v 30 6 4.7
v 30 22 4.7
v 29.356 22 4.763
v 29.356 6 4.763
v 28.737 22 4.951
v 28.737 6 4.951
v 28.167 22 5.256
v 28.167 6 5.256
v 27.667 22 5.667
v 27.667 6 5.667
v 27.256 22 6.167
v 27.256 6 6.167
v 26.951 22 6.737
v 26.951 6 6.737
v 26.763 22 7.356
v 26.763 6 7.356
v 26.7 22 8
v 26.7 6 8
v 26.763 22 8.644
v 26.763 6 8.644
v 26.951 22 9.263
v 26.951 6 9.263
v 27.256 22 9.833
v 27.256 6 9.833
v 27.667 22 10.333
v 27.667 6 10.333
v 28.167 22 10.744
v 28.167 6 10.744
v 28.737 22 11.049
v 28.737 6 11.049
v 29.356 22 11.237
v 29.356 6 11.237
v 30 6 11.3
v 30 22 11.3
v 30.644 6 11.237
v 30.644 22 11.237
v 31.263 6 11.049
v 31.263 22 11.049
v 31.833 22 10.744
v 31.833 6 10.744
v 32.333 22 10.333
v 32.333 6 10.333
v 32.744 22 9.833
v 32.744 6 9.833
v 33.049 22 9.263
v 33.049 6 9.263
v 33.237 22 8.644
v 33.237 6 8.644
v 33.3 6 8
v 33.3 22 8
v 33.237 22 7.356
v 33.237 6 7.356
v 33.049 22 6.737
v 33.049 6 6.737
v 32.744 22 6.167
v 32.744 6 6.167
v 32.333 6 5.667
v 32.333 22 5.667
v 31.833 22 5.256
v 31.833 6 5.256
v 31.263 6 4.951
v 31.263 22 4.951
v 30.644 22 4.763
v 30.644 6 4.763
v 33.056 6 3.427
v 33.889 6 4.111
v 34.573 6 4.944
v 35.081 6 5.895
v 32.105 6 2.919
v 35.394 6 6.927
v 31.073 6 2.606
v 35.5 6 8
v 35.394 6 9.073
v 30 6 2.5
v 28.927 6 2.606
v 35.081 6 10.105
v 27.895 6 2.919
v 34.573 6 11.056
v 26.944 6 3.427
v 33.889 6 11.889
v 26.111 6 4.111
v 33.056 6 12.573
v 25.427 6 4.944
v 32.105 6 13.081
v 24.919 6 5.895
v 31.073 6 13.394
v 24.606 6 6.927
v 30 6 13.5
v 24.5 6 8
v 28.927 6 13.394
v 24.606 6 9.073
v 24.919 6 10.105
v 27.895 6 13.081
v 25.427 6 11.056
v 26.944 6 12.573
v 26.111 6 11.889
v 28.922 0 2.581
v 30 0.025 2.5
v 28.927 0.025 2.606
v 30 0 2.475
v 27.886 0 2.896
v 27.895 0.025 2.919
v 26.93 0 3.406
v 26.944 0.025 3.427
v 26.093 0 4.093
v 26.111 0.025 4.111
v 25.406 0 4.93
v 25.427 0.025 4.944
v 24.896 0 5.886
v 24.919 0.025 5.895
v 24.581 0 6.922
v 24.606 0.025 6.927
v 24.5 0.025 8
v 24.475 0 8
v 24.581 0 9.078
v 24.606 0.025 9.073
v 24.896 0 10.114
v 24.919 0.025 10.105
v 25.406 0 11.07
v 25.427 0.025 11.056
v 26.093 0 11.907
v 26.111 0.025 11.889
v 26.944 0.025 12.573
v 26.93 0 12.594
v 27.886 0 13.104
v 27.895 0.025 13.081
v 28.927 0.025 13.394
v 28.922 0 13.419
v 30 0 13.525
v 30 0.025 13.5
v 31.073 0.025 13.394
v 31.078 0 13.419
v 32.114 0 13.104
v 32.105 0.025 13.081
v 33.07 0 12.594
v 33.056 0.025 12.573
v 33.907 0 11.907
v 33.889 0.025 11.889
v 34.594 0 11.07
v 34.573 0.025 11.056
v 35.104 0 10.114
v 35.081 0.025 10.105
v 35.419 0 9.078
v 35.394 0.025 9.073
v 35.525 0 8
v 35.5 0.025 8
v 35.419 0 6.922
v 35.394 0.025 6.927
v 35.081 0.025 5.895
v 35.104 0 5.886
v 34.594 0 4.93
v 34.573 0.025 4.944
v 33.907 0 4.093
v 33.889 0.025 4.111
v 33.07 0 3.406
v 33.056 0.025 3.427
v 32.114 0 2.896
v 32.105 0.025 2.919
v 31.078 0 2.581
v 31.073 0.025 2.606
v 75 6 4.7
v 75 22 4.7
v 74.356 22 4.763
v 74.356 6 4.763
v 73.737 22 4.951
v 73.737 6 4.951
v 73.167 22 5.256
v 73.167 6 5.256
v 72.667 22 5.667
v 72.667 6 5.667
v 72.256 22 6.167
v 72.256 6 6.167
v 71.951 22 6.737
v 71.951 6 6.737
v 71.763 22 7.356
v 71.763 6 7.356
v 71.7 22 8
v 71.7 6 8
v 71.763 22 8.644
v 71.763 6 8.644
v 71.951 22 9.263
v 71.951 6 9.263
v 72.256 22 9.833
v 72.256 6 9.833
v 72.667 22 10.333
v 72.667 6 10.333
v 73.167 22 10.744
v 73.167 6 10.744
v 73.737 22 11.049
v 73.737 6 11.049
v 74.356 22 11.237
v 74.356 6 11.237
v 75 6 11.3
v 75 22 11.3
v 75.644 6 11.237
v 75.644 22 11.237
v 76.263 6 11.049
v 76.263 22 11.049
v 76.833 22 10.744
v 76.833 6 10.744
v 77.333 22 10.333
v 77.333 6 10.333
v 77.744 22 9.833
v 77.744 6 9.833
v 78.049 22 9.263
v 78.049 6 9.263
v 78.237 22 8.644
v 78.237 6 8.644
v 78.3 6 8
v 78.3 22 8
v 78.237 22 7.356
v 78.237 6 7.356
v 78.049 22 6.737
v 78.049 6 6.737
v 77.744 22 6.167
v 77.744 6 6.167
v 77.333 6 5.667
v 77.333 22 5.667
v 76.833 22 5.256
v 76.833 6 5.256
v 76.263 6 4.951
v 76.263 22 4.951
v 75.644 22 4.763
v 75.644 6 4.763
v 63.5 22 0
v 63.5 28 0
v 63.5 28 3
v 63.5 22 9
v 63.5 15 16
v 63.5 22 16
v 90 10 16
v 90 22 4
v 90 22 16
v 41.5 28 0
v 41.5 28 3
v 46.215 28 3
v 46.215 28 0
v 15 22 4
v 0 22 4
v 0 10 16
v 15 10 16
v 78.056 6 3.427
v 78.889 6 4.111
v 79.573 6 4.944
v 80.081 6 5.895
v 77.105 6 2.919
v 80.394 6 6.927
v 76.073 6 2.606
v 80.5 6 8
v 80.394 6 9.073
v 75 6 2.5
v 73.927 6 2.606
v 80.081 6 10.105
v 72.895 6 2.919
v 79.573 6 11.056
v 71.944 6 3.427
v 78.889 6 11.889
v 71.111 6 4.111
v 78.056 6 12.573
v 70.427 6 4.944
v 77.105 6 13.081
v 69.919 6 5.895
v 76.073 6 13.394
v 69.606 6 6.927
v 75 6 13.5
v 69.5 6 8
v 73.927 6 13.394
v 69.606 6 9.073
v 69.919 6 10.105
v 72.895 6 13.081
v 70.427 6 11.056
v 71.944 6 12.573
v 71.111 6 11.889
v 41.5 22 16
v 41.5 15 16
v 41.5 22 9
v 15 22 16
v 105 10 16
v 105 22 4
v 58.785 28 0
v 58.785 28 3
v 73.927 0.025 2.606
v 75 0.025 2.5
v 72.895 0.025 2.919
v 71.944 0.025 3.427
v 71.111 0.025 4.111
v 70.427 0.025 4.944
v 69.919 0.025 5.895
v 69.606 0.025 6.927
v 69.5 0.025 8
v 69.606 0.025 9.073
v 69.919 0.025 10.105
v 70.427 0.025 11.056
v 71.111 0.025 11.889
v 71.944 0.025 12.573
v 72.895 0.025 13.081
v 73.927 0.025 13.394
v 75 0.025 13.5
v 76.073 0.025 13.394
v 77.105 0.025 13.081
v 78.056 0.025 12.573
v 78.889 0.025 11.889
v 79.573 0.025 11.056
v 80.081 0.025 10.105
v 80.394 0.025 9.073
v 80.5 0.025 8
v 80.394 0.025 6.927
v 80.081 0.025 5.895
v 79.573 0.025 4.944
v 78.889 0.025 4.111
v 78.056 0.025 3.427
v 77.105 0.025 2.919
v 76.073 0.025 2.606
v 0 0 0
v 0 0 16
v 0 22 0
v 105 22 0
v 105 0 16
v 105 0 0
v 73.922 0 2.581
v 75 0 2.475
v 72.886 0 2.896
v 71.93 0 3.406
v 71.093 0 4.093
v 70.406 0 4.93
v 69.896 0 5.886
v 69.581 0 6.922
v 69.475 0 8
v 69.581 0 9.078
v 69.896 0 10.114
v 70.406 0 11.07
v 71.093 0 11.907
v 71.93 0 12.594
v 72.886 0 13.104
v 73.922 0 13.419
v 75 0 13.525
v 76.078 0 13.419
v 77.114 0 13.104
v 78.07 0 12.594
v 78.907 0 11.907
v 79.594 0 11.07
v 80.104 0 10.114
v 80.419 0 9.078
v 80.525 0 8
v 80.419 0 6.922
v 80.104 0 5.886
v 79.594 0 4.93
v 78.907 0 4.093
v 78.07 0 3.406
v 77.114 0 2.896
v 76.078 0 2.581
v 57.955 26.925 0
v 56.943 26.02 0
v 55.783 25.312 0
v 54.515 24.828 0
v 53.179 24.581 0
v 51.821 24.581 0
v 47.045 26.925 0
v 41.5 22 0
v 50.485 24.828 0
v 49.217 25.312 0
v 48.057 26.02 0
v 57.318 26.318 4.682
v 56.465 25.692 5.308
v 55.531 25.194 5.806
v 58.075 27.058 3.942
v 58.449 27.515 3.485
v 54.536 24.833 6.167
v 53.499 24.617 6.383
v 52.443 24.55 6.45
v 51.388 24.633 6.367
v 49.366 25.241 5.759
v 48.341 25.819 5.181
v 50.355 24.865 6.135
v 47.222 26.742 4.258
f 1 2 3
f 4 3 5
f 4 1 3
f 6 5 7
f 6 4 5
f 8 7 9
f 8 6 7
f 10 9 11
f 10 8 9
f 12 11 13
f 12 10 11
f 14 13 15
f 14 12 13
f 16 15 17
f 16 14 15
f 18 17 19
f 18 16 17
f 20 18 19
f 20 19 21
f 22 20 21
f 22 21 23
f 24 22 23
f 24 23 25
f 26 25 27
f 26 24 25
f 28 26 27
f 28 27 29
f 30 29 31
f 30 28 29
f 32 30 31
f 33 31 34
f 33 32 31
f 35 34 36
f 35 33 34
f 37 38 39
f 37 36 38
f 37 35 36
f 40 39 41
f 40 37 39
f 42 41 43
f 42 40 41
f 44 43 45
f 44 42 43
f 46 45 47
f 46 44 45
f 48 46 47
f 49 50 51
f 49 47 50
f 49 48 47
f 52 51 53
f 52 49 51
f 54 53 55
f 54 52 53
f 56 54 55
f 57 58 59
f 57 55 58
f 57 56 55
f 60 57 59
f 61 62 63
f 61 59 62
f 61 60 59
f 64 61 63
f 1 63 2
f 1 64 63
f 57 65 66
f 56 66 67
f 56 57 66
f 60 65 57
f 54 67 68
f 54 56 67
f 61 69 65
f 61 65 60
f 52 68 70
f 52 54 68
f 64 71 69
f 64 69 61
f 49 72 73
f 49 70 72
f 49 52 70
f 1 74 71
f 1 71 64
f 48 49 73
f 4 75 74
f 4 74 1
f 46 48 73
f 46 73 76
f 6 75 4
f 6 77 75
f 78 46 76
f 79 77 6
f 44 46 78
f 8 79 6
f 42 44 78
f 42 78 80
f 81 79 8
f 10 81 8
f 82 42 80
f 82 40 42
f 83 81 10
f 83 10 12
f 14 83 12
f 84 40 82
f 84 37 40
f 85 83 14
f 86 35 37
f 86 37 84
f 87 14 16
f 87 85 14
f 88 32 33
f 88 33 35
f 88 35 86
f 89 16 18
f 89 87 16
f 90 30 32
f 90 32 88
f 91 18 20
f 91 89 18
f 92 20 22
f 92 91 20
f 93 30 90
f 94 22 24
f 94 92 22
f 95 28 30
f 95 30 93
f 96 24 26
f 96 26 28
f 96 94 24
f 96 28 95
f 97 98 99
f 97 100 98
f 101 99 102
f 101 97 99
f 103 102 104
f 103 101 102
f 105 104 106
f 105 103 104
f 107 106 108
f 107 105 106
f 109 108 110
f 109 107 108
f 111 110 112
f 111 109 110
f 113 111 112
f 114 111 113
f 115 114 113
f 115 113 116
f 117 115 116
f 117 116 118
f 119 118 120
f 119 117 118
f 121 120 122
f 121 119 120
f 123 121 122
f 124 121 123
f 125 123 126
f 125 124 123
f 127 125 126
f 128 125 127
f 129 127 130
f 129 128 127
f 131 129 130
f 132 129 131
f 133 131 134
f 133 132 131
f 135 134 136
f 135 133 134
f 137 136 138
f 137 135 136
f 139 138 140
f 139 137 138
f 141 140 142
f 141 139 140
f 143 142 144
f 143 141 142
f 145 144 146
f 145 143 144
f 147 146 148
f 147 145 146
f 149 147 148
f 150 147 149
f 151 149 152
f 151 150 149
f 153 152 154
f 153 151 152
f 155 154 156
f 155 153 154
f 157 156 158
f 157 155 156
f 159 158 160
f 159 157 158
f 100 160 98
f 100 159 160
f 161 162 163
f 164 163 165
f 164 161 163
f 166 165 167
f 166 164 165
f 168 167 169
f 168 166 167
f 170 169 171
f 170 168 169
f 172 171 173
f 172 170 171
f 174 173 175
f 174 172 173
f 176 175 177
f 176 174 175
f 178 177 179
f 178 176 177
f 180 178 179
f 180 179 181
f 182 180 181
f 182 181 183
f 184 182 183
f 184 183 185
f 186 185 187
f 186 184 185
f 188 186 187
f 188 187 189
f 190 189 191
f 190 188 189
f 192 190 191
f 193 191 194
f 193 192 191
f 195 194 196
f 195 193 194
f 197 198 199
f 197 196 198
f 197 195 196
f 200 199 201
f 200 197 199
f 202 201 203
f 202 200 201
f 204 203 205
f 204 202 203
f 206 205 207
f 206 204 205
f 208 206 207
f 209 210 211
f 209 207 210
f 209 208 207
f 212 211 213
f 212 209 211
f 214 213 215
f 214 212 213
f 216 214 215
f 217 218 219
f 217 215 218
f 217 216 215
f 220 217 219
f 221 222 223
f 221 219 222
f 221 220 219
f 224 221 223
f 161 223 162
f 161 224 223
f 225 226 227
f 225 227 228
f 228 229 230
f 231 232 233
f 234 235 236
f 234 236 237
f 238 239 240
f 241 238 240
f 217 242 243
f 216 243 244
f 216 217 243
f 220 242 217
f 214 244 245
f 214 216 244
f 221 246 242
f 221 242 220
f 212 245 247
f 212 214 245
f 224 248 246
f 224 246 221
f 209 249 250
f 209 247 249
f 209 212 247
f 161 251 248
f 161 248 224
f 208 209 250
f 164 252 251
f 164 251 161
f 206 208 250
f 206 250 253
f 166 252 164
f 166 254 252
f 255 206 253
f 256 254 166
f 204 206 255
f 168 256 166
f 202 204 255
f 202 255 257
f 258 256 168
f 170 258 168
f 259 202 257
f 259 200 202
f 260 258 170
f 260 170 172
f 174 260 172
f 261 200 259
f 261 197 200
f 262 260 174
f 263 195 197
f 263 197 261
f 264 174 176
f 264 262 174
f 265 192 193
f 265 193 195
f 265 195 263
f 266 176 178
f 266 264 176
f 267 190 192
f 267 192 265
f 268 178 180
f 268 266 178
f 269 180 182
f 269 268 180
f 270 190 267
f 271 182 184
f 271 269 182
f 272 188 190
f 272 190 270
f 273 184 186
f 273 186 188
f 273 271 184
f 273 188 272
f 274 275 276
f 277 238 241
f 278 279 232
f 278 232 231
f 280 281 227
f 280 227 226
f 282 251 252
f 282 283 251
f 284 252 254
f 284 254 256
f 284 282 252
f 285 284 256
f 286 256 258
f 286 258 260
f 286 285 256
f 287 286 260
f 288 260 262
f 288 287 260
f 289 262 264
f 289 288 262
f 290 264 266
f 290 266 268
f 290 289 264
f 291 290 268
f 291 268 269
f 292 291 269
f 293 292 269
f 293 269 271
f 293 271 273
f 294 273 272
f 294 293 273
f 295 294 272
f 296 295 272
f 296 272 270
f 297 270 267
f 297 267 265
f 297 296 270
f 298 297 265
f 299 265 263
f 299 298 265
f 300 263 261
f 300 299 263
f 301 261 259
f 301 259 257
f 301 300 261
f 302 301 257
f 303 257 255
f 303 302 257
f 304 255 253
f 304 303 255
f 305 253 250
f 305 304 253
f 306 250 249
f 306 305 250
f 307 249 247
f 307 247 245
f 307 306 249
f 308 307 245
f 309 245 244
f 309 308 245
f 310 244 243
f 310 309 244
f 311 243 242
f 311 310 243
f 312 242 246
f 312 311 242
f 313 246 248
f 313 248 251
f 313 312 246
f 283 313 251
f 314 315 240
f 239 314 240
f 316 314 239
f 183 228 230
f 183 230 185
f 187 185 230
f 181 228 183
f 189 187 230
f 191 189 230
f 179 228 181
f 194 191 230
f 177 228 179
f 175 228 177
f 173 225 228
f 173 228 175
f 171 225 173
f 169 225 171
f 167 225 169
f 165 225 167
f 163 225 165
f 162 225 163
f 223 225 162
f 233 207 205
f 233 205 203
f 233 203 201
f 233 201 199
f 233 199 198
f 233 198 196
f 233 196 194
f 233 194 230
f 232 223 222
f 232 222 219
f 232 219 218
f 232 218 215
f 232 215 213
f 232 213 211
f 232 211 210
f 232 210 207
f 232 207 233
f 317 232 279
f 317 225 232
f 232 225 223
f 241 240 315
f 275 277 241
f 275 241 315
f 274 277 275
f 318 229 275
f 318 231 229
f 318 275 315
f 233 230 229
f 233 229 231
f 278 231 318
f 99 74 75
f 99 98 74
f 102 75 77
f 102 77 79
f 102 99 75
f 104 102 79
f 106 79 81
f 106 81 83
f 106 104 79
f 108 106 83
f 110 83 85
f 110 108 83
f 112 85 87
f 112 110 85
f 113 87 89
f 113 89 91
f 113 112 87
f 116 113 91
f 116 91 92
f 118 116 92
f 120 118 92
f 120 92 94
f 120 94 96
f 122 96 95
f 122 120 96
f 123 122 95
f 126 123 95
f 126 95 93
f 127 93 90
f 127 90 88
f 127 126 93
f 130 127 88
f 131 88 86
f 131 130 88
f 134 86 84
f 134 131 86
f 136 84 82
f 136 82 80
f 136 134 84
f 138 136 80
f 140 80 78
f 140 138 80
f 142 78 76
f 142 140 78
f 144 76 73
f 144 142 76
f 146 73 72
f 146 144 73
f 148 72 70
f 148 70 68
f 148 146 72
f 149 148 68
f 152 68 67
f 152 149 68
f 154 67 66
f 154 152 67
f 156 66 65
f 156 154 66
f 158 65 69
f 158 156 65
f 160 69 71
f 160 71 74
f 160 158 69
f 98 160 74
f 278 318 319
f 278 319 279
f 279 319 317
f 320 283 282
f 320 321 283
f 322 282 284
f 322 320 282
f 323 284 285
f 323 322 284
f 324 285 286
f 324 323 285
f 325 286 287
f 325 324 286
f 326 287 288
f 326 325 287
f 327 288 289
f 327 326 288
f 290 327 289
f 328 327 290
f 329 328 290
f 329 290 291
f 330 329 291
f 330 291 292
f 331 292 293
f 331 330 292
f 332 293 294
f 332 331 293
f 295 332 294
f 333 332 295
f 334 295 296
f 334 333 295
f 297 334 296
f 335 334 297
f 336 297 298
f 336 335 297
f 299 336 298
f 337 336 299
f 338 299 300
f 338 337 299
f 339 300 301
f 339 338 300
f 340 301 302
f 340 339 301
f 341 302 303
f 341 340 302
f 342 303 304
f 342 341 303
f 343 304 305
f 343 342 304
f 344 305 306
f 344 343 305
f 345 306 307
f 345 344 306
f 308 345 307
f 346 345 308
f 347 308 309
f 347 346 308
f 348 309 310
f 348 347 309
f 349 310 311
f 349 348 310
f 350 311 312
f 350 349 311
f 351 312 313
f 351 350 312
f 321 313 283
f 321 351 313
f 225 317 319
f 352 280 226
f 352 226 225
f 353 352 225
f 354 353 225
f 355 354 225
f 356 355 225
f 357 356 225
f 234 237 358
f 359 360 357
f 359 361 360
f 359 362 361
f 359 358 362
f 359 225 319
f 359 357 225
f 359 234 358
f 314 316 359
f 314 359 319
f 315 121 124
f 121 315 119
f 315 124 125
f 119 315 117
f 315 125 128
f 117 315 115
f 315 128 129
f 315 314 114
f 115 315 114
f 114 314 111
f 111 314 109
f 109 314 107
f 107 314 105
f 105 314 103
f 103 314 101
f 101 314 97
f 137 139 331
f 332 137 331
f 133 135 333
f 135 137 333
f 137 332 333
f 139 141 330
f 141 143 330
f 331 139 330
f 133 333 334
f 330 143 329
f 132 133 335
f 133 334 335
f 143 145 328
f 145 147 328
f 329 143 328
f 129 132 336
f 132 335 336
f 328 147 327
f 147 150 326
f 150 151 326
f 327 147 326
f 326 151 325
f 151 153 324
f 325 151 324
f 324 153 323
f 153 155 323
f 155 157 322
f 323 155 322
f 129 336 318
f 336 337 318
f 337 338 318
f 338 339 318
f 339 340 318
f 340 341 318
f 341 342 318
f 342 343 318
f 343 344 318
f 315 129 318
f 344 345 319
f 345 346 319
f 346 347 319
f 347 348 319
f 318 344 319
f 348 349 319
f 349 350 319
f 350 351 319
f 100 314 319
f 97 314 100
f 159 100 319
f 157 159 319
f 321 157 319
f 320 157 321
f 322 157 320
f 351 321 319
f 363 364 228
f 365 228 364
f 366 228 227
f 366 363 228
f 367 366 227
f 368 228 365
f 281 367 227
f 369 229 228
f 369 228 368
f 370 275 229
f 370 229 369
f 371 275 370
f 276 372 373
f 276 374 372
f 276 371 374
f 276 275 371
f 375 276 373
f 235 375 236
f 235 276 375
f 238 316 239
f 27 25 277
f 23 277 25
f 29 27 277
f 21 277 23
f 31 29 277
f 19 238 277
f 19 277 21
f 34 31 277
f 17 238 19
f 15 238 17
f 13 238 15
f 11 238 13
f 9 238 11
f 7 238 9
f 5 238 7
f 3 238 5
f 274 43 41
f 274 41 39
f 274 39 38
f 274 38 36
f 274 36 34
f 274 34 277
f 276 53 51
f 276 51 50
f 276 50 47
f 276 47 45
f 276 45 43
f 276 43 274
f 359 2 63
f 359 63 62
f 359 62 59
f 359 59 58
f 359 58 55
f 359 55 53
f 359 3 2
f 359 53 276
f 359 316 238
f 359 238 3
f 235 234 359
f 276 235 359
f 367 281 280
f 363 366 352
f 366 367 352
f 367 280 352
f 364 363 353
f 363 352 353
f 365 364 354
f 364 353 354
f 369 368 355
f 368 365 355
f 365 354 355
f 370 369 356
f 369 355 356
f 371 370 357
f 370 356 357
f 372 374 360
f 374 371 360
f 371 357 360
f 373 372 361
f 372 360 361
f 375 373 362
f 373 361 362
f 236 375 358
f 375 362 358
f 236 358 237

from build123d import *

# Parameters (mm, degrees)
CROQUIS1_W                                   = 105
CROQUIS1_H                                   = 22
SALIENTE_EXTRUIR1_DEPTH                      = 16
CORTAR_EXTRUIR2_DEPTH                        = 15
CORTAR_EXTRUIR3_START                        = -105
CORTAR_EXTRUIR3_DEPTH                        = 15
CROQUIS3_W                                   = 22
CROQUIS3_H                                   = 14
CORTAR_EXTRUIR4_DEPTH                        = 109.466584716
SALIENTE_EXTRUIR3_DEPTH                      = 22
CROQUIS5_R                                   = 7.45
CORTAR_EXTRUIR6_DEPTH                        = 15
REFRENTADO_PARA_TORNILLO_TAP_N_CON_C_2_COUNT = 2
REFRENTADO_PARA_TORNILLO_TAP_N_CON_C_2_PITCH = 45


with BuildPart() as part:
    # Croquis1 → Saliente-Extruir1 (new body)
    with BuildSketch(Plane.XY):
        with Locations((52.5, 11)):
            Rectangle(CROQUIS1_W, CROQUIS1_H)
    extrude(amount=SALIENTE_EXTRUIR1_DEPTH)

    # Croquis2 → Cortar-Extruir2 (cut)
    with BuildSketch(Plane(origin=(105, 0, 0), x_dir=(0, 0, -1), z_dir=(1, 0, 0))):
        Polygon((-16, 10), (-16, 22), (-4, 22), align=None)
    extrude(amount=-CORTAR_EXTRUIR2_DEPTH, mode=Mode.SUBTRACT)

    # Croquis2<2> → Cortar-Extruir3 (cut)
    with BuildSketch(Plane(origin=(105, 0, 0), x_dir=(0, 0, -1), z_dir=(1, 0, 0)).offset(CORTAR_EXTRUIR3_START)):
        Polygon((-16, 10), (-16, 22), (-4, 22), align=None)
    extrude(amount=CORTAR_EXTRUIR3_DEPTH, mode=Mode.SUBTRACT)

    # Croquis3 → Cortar-Extruir4 (cut, through all)
    with BuildSketch(Plane.XY.offset(16)):
        with Locations((52.5, 22)):
            Rectangle(CROQUIS3_W, CROQUIS3_H)
    extrude(amount=-CORTAR_EXTRUIR4_DEPTH, mode=Mode.SUBTRACT)

    # Croquis4 → Saliente-Extruir3 (add)
    with BuildSketch(Plane(origin=(41.5, 0, 0), x_dir=(0, 0, -1), z_dir=(1, 0, 0))):
        Polygon((-16, 15), (-3, 28), (0, 28), (0, 15), align=None)
    extrude(amount=SALIENTE_EXTRUIR3_DEPTH)

    # Croquis5 → Cortar-Extruir6 (cut)
    with BuildSketch(Plane(origin=(0, 0, 0), x_dir=(-1, 0, 0), z_dir=(0, 0, -1))):
        with Locations((-52.5, 32)):
            Circle(CROQUIS5_R)
    extrude(amount=-CORTAR_EXTRUIR6_DEPTH, mode=Mode.SUBTRACT)

    # Croquis9 → Refrentado para tornillo tapón con cabeza de clavija de M61 (revolve, cut)
    with BuildSketch(Plane(origin=(30, 0, 8), x_dir=(0, 0, -1), z_dir=(1, 0, 0))):
        Polygon((0, 0), (0, 28), (3.3, 28), (3.3, 6), (5.5, 6), (5.5, 0.025), (5.525, 0), align=None)
    refrentado_para_tornillo_tap_n_con_cabez = revolve(axis=Axis((30, -6.35, 8), (0, 1, 0)), mode=Mode.SUBTRACT)

    # Refrentado para tornillo tap_n con c 2: Refrentado para tornillo tapón con cabeza de clavija de M61 ×2
    with Locations(*[(i * REFRENTADO_PARA_TORNILLO_TAP_N_CON_C_2_PITCH, 0, 0) for i in range(1, REFRENTADO_PARA_TORNILLO_TAP_N_CON_C_2_COUNT)]):
        add(refrentado_para_tornillo_tap_n_con_cabez, mode=Mode.SUBTRACT)


solid = part.part
